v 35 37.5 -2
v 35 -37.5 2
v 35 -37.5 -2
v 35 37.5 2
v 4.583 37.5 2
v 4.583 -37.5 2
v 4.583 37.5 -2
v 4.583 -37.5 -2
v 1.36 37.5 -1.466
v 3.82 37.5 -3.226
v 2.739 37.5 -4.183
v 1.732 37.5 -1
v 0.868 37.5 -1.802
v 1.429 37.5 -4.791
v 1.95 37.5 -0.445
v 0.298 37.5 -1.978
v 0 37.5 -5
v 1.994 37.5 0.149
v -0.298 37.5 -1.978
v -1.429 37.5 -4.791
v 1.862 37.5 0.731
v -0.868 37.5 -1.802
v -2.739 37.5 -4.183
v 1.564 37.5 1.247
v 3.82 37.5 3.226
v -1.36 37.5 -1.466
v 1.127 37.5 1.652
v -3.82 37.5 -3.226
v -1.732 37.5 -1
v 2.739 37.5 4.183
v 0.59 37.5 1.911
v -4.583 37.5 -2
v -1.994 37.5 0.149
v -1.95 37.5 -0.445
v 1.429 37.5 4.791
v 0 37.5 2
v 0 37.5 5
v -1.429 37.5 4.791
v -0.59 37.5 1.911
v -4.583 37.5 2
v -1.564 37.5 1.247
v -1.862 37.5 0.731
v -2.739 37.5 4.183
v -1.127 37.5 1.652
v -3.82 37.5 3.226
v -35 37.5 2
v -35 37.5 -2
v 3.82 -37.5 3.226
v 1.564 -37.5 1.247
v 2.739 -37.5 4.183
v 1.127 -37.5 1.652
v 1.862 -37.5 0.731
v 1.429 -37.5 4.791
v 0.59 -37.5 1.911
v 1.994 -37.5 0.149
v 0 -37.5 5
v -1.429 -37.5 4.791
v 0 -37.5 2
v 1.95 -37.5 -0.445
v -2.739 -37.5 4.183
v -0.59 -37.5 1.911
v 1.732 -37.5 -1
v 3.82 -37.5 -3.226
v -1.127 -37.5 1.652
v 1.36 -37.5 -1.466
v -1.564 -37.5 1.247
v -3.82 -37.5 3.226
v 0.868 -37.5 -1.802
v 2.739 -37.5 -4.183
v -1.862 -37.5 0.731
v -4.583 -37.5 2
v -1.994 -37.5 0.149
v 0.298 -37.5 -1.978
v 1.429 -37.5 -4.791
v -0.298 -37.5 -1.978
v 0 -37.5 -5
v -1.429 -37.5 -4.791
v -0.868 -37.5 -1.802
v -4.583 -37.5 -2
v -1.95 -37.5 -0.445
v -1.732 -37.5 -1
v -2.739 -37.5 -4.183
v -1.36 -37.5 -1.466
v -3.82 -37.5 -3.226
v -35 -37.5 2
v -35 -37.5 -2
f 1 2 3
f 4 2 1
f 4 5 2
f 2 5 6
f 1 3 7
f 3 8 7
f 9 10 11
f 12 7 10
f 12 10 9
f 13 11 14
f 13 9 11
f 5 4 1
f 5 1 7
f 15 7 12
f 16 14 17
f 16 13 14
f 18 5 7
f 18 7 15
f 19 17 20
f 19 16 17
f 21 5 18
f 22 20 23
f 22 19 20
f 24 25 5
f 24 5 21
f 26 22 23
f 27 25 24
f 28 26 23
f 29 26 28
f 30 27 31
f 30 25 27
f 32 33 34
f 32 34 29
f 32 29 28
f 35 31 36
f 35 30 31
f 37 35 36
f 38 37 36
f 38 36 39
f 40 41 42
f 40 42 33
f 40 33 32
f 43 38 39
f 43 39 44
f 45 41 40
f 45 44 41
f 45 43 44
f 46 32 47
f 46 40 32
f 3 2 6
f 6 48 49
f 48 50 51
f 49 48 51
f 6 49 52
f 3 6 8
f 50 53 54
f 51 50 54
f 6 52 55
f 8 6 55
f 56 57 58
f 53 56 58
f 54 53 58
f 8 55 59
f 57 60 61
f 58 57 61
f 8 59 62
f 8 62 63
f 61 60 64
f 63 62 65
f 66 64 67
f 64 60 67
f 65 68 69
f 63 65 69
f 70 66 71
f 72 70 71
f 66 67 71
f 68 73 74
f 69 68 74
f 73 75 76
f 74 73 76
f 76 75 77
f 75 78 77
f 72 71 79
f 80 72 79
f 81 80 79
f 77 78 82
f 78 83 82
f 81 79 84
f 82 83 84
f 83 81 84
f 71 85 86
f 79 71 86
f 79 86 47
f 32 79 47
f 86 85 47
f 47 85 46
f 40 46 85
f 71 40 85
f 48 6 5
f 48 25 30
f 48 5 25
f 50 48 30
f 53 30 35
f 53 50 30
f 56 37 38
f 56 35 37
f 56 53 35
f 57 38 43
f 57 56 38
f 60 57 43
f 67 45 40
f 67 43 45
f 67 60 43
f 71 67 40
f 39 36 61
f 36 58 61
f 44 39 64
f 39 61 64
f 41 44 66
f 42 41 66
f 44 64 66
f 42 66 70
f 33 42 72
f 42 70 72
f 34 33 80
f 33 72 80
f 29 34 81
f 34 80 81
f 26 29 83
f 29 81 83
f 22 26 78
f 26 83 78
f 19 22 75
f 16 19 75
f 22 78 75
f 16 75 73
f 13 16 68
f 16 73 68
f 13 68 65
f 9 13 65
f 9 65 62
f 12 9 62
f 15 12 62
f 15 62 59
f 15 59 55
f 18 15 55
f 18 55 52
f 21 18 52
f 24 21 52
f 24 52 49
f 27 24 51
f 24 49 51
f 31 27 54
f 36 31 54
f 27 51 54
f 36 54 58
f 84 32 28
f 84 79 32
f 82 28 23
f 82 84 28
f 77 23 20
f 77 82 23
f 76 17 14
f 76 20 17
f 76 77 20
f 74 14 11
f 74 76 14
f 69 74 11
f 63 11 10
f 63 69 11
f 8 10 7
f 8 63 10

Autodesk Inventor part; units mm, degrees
ref_plane "YZ Plane" through (0, 0, 0) normal (1, 0, 0) x (0, 1, 0)
ref_plane "XZ Plane" through (0, 0, 0) normal (0, 1, 0) x (-1, 0, 0)
ref_plane "XY Plane" through (0, 0, 0) normal (0, 0, 1) x (1, 0, 0)
sketch "Sketch1" plane through (0, 0, 0) normal (0, 1, 0) x (-1, 0, 0)
  circle A0 centre (0, 0) radius 5
  dimension "d0" = 10
extrude "Extrusion1" add sketch "Sketch1" along normal mid plane 75
sketch "Sketch2" plane through (0, 0, 0) normal (1, 0, 0) x (0, 1, 0)
  line L0 (37.5, -5) -> (37.5, 5) projected
  line L1 (37.5, 0) -> (37.5, 2)
  line L2 (37.5, 2) -> (37.5, -2)
  line L3 (37.5, 2) -> (-37.5, 2)
  line L4 (-37.5, 2) -> (-37.5, -2)
  line L5 (-37.5, -2) -> (37.5, -2)
  line L6 (37.5, -2) -> (37.5, 2)
  point P0 (0, 0)
  dimension "d4" = 4
  dimension "d5" = 75
sketch "Sketch3" plane through (0, 0, 0) normal (1, 0, 0) x (0, 1, 0)
  point P0 (0, 0)
extrude "Extrusion2" add sketch "Sketch2" along normal mid plane 70
sketch "Sketch4" plane through (0, 37.5, 0) normal (0, 1, 0) x (1, 0, 0)
  point P0 (0, 0)
hole "Hole1" at (0, 37.5, 0) direction (0, -1, 0) diameter 4 depth 120
properties part number "doughvpush"
